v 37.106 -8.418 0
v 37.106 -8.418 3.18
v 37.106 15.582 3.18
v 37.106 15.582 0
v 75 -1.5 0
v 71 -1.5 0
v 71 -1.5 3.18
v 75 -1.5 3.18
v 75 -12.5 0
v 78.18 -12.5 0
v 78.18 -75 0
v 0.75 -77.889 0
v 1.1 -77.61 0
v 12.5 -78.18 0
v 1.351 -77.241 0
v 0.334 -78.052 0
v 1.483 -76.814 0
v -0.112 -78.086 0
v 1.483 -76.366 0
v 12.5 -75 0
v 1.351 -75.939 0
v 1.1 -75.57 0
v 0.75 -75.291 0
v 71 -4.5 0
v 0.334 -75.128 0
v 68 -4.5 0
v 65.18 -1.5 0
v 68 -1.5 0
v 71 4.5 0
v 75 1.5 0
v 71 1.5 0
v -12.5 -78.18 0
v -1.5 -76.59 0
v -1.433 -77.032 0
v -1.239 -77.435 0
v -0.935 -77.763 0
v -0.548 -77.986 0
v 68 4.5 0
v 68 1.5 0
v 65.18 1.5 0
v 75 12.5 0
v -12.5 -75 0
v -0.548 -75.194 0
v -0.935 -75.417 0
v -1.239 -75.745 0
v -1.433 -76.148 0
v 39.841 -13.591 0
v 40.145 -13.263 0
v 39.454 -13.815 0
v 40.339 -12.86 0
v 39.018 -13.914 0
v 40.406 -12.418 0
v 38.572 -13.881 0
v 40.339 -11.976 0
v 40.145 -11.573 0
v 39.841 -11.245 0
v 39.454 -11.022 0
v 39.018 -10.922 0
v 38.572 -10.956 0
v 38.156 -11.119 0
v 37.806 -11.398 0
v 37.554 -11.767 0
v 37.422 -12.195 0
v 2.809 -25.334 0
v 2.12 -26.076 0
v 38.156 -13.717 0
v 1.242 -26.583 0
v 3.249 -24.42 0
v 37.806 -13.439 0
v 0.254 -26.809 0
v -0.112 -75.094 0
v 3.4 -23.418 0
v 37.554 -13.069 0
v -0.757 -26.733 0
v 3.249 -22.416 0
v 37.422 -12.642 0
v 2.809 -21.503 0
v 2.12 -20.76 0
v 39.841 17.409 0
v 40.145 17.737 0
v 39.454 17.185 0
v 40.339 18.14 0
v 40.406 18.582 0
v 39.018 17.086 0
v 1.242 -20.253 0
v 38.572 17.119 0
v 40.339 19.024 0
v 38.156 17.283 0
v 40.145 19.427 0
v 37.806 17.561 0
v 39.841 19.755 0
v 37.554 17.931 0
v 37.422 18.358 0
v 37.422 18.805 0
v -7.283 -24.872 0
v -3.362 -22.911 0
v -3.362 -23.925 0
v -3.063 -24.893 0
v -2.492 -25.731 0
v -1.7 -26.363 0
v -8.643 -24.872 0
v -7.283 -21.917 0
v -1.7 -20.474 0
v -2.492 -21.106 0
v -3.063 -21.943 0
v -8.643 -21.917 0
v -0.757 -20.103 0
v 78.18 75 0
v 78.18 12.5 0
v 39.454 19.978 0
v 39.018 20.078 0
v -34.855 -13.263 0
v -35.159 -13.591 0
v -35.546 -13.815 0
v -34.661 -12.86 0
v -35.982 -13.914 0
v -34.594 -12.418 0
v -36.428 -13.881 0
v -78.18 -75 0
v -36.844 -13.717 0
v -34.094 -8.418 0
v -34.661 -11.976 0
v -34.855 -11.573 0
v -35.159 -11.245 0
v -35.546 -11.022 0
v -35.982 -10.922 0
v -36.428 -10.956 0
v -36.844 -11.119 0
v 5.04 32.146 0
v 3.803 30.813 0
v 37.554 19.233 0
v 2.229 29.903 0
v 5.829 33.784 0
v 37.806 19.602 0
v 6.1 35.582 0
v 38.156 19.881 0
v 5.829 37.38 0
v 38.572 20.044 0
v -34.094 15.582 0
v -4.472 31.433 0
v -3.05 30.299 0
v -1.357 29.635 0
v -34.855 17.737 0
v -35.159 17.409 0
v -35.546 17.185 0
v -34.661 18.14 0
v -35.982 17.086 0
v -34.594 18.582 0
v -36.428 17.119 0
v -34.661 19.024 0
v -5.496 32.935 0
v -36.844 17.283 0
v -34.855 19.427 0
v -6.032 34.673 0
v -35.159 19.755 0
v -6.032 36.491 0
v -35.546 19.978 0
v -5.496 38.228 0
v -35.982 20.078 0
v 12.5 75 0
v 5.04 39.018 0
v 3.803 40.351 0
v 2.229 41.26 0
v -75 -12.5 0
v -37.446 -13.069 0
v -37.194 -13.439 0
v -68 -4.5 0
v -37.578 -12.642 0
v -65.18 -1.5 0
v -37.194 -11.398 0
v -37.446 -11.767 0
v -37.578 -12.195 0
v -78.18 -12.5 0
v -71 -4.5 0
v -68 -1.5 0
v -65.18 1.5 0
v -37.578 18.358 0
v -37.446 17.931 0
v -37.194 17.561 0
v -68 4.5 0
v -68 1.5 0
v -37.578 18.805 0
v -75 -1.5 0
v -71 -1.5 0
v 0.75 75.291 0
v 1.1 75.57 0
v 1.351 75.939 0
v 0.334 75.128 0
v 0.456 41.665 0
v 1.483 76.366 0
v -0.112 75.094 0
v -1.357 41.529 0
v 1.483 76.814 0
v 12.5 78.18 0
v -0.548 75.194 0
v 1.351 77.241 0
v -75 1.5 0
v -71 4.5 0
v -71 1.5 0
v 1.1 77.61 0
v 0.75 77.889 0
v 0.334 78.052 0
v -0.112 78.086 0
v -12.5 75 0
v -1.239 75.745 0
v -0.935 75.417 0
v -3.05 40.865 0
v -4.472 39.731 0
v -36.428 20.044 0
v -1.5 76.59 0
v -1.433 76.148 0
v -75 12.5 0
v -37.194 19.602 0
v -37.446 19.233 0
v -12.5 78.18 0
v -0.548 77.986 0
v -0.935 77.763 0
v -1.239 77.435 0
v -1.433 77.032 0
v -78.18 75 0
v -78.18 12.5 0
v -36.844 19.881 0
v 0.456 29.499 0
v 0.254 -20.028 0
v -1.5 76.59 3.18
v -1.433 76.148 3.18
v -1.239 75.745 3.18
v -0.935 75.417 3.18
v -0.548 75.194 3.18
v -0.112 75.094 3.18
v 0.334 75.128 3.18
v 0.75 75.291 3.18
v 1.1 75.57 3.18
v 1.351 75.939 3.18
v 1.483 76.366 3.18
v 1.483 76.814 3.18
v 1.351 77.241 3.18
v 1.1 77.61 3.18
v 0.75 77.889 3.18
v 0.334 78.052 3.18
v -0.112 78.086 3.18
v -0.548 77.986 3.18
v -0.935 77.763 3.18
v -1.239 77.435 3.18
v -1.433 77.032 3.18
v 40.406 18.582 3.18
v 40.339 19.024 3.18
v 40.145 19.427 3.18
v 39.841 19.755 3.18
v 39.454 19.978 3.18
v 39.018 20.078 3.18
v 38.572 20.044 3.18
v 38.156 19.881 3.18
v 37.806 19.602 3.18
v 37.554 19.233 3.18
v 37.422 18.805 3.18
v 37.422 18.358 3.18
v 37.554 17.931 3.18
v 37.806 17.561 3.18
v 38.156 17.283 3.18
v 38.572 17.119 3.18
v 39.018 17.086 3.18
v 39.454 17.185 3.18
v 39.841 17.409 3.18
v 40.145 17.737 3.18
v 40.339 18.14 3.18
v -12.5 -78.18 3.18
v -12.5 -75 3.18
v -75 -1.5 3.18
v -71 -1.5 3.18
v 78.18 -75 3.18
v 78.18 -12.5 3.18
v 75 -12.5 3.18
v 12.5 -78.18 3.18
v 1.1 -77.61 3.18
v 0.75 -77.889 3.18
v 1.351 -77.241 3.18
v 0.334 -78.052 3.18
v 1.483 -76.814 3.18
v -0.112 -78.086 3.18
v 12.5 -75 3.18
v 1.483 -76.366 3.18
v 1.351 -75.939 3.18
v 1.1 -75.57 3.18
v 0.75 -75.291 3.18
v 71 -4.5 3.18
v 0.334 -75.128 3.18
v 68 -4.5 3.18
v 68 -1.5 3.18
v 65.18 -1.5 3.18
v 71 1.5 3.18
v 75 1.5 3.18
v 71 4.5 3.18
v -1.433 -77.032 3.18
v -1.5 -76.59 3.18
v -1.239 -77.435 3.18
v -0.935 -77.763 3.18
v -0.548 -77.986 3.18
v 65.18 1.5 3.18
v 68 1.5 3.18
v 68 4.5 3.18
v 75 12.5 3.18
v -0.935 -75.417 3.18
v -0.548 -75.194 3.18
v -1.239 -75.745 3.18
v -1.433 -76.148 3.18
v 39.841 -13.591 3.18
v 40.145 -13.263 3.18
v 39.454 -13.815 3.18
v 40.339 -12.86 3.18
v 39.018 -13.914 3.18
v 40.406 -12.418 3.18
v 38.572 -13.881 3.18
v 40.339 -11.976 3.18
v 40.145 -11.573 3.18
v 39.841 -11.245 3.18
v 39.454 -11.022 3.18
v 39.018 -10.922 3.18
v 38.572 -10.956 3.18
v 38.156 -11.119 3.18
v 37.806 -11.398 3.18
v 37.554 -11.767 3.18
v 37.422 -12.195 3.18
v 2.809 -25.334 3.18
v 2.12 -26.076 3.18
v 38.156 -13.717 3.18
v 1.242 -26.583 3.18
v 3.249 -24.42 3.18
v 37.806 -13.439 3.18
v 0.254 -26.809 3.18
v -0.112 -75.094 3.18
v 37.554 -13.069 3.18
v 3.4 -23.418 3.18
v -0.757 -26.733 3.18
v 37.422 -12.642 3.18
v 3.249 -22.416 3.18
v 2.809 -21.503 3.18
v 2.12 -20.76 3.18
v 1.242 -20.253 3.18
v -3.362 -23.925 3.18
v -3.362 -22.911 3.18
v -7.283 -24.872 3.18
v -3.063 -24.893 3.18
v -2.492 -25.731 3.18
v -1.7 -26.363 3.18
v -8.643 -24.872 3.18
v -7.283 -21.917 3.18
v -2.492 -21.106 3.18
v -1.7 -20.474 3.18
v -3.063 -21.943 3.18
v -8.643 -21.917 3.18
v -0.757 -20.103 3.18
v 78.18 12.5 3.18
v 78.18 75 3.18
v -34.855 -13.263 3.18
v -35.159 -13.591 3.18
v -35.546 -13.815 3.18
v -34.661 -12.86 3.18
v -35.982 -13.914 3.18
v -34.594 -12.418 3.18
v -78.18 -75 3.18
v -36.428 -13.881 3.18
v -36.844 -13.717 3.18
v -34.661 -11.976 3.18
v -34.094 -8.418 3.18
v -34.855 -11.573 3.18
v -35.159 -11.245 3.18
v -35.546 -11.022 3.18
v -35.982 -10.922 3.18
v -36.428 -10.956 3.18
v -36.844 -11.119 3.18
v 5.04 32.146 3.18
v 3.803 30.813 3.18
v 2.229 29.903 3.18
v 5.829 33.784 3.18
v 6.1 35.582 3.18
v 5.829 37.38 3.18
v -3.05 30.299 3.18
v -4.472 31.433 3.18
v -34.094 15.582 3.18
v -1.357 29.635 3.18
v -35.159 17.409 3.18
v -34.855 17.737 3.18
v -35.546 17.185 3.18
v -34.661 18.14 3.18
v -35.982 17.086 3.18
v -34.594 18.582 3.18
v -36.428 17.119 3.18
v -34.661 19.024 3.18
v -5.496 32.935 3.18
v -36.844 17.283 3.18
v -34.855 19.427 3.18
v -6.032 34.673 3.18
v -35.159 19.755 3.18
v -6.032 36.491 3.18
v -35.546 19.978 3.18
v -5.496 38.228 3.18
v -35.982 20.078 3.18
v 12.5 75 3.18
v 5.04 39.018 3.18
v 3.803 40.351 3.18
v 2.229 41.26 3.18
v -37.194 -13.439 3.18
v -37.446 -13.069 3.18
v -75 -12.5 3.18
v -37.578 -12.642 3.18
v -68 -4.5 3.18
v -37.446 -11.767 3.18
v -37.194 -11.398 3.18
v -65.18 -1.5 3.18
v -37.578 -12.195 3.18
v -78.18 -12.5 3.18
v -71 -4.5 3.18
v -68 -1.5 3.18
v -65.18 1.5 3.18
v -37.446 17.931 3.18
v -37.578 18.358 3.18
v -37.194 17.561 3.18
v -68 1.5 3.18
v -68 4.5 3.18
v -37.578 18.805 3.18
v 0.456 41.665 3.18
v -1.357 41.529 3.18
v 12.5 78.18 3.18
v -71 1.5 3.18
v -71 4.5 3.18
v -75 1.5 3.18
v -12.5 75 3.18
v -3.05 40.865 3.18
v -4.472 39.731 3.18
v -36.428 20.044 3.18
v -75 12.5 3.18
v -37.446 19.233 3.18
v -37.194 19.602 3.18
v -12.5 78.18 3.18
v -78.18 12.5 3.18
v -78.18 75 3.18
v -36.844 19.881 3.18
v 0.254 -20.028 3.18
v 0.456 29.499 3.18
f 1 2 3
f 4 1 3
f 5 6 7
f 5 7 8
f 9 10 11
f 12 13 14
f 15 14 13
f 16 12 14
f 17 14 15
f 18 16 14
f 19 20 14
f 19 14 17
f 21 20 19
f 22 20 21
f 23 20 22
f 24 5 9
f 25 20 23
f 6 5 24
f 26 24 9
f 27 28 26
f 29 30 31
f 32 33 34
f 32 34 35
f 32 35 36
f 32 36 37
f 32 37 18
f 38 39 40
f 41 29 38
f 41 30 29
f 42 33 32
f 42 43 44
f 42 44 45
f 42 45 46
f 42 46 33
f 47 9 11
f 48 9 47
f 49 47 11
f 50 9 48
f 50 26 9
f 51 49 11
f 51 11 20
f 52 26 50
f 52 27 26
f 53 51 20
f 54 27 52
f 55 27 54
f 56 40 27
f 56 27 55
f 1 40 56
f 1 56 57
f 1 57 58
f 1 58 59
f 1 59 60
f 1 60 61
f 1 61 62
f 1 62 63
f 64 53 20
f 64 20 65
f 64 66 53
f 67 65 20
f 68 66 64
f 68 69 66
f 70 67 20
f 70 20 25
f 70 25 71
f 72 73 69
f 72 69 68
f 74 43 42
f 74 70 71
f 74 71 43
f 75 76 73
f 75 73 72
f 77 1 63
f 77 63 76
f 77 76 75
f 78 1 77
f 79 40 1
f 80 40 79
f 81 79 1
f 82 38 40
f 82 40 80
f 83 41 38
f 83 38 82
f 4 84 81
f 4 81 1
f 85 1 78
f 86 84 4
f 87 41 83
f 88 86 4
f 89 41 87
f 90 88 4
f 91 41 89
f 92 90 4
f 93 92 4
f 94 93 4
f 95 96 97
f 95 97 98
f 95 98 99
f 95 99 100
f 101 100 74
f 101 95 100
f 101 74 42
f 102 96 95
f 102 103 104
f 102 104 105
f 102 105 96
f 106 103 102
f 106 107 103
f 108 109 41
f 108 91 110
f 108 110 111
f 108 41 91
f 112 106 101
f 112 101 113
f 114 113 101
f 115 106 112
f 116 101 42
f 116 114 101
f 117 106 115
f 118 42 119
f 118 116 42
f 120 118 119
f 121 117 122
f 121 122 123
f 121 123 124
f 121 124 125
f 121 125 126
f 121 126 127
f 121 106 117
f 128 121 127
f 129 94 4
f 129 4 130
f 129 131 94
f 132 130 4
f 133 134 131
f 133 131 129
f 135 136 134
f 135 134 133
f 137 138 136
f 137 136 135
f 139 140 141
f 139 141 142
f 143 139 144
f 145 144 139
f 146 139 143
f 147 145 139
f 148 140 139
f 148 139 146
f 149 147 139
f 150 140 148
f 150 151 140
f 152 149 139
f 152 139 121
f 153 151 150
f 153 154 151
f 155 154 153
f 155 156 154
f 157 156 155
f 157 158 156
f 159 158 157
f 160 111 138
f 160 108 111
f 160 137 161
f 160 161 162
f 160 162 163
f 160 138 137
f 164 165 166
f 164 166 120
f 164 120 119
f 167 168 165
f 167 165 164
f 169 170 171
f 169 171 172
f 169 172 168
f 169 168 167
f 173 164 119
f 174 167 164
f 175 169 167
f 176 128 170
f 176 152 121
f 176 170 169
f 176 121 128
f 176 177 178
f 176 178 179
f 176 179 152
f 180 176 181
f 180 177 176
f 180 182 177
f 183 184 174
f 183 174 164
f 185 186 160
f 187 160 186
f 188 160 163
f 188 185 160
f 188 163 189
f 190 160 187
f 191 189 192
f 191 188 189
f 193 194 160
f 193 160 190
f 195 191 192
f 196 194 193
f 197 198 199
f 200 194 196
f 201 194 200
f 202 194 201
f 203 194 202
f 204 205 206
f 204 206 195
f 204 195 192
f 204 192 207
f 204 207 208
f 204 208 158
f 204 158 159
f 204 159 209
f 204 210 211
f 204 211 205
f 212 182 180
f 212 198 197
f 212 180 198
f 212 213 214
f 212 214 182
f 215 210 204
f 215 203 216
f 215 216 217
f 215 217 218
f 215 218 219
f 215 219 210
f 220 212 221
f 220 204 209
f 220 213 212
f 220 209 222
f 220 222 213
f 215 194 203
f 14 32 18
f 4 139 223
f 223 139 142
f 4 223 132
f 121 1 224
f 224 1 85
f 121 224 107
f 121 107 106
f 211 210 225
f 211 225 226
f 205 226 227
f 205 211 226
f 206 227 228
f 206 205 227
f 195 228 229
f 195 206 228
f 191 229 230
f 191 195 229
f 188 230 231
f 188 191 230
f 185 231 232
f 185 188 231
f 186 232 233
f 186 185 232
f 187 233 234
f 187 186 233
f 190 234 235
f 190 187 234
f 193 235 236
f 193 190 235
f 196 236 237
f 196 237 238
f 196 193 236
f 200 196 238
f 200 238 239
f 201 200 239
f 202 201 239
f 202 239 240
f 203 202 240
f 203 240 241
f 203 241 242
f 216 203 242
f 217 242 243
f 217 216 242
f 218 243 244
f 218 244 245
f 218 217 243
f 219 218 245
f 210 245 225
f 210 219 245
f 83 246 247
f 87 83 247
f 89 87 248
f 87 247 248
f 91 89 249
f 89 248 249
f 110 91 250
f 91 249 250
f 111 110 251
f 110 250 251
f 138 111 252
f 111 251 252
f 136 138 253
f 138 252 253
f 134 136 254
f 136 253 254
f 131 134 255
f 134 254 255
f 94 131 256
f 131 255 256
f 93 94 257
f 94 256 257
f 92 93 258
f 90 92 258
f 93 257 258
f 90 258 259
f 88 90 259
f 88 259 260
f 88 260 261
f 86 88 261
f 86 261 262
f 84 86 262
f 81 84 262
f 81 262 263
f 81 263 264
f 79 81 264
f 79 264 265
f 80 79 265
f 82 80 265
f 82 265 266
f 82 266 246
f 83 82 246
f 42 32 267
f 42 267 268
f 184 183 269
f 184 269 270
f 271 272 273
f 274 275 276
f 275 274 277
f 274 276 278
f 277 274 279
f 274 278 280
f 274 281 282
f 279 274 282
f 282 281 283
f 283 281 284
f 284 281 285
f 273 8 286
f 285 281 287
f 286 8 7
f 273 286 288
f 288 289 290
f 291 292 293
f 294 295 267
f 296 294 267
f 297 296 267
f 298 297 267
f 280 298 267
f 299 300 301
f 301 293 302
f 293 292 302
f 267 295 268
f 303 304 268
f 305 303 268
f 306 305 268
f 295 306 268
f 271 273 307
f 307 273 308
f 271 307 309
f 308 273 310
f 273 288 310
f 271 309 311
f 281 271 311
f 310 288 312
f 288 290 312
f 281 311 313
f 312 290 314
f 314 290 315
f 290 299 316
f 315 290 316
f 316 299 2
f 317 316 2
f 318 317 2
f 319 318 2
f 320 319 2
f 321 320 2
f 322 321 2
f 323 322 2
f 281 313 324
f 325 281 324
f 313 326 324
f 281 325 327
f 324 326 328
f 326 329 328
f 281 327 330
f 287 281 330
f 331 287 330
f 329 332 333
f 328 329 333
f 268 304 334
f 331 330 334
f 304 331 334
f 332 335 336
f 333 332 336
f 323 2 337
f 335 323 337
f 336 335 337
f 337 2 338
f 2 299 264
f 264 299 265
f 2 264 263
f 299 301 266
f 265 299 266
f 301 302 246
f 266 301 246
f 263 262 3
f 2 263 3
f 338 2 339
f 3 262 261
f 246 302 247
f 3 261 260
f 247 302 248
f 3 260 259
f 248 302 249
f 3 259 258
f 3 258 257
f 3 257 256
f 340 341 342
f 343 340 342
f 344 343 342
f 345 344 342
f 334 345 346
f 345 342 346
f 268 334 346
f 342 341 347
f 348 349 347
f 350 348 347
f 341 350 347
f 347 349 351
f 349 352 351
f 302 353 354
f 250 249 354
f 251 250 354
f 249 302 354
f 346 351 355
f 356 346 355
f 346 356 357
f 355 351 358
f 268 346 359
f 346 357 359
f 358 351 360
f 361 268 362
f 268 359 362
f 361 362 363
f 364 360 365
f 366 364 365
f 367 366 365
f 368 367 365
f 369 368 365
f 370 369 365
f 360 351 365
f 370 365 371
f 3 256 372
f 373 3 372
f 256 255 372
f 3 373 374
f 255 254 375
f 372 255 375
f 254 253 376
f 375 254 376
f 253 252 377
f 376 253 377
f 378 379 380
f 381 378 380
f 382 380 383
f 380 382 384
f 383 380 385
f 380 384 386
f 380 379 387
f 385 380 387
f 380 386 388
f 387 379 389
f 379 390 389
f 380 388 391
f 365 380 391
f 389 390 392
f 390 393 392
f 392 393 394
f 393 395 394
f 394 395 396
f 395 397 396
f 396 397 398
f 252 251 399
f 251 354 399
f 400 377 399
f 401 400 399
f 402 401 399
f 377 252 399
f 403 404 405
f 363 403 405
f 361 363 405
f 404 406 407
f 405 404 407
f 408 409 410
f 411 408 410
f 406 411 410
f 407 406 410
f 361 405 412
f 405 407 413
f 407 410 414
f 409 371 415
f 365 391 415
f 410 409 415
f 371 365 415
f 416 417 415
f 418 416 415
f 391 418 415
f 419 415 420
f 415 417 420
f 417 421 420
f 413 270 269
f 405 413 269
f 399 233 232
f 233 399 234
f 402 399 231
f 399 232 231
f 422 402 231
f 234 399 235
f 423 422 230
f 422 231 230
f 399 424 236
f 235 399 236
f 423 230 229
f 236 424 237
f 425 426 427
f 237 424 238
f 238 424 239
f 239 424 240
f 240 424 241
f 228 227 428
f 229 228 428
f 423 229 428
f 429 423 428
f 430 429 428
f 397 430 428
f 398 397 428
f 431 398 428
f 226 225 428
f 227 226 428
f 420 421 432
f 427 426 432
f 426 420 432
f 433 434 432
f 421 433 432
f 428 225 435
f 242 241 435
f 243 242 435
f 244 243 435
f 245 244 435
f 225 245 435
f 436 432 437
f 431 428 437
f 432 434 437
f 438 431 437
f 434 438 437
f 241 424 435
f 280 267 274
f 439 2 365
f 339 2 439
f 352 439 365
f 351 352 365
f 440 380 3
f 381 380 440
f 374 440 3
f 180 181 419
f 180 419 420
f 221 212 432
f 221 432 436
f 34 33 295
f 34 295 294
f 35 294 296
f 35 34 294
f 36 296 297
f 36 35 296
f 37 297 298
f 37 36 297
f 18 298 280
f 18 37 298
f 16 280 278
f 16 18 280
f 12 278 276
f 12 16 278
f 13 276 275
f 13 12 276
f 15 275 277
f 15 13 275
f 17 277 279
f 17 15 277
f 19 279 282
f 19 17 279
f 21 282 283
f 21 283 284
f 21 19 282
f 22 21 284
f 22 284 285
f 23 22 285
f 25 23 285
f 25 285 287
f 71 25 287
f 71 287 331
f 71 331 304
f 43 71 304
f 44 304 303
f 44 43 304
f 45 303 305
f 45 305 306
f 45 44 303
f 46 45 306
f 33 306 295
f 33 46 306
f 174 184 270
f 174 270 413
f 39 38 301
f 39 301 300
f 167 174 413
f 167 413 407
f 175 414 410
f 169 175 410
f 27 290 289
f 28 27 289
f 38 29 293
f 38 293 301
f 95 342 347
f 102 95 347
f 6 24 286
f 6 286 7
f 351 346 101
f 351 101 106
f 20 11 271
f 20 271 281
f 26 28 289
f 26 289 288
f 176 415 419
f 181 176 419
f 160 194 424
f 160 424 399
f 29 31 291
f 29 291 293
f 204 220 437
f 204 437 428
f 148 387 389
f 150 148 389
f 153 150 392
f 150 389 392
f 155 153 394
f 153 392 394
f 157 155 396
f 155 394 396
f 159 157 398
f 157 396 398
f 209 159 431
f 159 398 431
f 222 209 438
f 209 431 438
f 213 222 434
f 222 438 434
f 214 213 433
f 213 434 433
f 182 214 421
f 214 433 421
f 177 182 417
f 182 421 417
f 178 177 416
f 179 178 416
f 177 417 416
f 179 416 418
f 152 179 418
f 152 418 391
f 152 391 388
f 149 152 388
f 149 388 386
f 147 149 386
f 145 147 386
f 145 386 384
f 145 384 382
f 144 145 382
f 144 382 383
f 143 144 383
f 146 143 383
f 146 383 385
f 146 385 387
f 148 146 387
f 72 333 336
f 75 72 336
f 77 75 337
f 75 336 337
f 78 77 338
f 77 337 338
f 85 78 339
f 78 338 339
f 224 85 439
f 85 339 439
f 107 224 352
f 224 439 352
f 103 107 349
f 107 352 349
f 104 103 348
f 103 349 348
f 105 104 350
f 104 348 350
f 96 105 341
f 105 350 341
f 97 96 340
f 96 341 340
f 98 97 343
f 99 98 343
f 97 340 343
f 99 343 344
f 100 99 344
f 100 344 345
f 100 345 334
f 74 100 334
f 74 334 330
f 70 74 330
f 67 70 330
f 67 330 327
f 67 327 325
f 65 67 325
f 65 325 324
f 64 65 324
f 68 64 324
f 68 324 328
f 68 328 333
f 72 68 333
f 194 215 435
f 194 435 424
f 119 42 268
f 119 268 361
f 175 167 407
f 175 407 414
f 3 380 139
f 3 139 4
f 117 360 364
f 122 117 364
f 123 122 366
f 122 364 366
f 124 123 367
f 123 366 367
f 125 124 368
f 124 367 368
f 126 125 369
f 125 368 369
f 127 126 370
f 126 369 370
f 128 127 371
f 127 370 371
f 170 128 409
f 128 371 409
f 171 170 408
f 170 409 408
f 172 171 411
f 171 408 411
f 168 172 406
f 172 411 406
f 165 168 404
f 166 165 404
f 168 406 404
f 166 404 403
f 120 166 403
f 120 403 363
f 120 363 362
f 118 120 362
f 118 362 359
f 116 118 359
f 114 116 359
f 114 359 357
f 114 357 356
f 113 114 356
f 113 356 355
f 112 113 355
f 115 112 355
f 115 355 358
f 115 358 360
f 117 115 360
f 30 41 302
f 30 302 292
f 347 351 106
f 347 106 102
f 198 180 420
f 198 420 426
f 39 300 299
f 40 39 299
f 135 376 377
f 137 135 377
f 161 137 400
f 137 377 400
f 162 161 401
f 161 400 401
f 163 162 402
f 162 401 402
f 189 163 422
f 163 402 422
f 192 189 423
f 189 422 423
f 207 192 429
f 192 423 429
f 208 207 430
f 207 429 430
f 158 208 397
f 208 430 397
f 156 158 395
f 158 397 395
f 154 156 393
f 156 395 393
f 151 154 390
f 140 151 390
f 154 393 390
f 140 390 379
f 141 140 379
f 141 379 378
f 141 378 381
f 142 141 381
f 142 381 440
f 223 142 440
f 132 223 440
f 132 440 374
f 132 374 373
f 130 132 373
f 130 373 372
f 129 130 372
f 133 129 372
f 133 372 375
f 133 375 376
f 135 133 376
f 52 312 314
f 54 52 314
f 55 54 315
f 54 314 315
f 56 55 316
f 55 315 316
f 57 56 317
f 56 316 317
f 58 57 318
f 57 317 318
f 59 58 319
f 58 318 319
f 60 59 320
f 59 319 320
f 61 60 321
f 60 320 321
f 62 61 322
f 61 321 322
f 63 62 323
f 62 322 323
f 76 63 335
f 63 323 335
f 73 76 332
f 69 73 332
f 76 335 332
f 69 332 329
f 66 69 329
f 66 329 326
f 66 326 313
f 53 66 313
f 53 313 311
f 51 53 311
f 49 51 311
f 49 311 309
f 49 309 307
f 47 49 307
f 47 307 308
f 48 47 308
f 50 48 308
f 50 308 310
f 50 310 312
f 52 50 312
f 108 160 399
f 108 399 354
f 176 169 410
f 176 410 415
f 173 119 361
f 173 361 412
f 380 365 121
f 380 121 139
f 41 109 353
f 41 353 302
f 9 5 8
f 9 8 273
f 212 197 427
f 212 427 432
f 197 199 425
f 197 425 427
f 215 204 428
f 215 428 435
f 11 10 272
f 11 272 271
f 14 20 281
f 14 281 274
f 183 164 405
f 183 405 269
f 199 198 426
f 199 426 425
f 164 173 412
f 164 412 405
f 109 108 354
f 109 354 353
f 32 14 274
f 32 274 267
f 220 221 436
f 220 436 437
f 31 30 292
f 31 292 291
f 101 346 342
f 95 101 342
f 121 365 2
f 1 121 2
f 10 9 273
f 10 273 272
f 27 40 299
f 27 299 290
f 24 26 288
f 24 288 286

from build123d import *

# Parameters (mm, degrees)
SKETCH1_R           = 1.5
BOSS_EXTRUDE1_DEPTH = 3.18
SKETCH6_R           = 1.5
SKETCH6_W           = 71.2
SKETCH6_H           = 24
CUT_EXTRUDE2_DEPTH  = 10
SKETCH7_R           = 3.4
CUT_EXTRUDE3_DEPTH  = 10
SKETCH8_R           = 6.1
CUT_EXTRUDE4_DEPTH  = 10
SKETCH9_W           = 1.359875129
SKETCH9_H           = 2.955102212
CUT_EXTRUDE5_DEPTH  = 10


with BuildPart() as part:
    # Sketch1 → Boss-Extrude1 (new body)
    with BuildSketch(Plane.XY):
        Polygon((-78.18, 75), (-12.5, 75), (-12.5, 78.18), (12.5, 78.18), (12.5, 75), (78.18, 75), (78.18, 12.5), (75, 12.5), (75, 1.5), (71, 1.5), (71, 4.5), (68, 4.5), (68, 1.5), (65.18, 1.5), (65.18, -1.5), (68, -1.5), (68, -4.5), (71, -4.5), (71, -1.5), (75, -1.5), (75, -12.5), (78.18, -12.5), (78.18, -75), (12.5, -75), (12.5, -78.18), (-12.5, -78.18), (-12.5, -75), (-78.18, -75), (-78.18, -12.5), (-75, -12.5), (-75, -1.5), (-71, -1.5), (-71, -4.5), (-68, -4.5), (-68, -1.5), (-65.18, -1.5), (-65.18, 1.5), (-68, 1.5), (-68, 4.5), (-71, 4.5), (-71, 1.5), (-75, 1.5), (-75, 12.5), (-78.18, 12.5), align=None)
        with Locations(Location((0, -76.59, 0), (0, 0, 180))):
            Circle(SKETCH1_R, mode=Mode.SUBTRACT)
        with Locations(Location((0, 76.59, 0), (0, 0, 180))):
            Circle(SKETCH1_R, mode=Mode.SUBTRACT)
    extrude(amount=BOSS_EXTRUDE1_DEPTH)

    # Sketch6 → Cut-Extrude2 (cut)
    with BuildSketch(Plane.XY.offset(3.18)):
        with Locations((-36.094459363, 18.581758052)):
            Circle(SKETCH6_R)
        with Locations((-36.094459363, -12.418241948)):
            Circle(SKETCH6_R)
        with Locations((38.905540637, -12.418241948)):
            Circle(SKETCH6_R)
        with Locations((38.905540637, 18.581758052)):
            Circle(SKETCH6_R)
        with Locations((1.505540637, 3.581758052)):
            Rectangle(SKETCH6_W, SKETCH6_H)
    extrude(amount=-CUT_EXTRUDE2_DEPTH, mode=Mode.SUBTRACT)

    # Sketch7 → Cut-Extrude3 (cut)
    with BuildSketch(Plane.XY.offset(3.18)):
        with Locations((0, -23.418241948)):
            Circle(SKETCH7_R)
    extrude(amount=-CUT_EXTRUDE3_DEPTH, mode=Mode.SUBTRACT)

    # Sketch8 → Cut-Extrude4 (cut)
    with BuildSketch(Plane.XY.offset(3.18)):
        with Locations((0, 35.581758052)):
            Circle(SKETCH8_R)
    extrude(amount=-CUT_EXTRUDE4_DEPTH, mode=Mode.SUBTRACT)

    # Sketch9 → Cut-Extrude5 (cut)
    with BuildSketch(Plane.XY.offset(3.18)):
        with Locations((-7.96280577, -23.394151807)):
            Rectangle(SKETCH9_W, SKETCH9_H)
    extrude(amount=-CUT_EXTRUDE5_DEPTH, mode=Mode.SUBTRACT)


solid = part.part
